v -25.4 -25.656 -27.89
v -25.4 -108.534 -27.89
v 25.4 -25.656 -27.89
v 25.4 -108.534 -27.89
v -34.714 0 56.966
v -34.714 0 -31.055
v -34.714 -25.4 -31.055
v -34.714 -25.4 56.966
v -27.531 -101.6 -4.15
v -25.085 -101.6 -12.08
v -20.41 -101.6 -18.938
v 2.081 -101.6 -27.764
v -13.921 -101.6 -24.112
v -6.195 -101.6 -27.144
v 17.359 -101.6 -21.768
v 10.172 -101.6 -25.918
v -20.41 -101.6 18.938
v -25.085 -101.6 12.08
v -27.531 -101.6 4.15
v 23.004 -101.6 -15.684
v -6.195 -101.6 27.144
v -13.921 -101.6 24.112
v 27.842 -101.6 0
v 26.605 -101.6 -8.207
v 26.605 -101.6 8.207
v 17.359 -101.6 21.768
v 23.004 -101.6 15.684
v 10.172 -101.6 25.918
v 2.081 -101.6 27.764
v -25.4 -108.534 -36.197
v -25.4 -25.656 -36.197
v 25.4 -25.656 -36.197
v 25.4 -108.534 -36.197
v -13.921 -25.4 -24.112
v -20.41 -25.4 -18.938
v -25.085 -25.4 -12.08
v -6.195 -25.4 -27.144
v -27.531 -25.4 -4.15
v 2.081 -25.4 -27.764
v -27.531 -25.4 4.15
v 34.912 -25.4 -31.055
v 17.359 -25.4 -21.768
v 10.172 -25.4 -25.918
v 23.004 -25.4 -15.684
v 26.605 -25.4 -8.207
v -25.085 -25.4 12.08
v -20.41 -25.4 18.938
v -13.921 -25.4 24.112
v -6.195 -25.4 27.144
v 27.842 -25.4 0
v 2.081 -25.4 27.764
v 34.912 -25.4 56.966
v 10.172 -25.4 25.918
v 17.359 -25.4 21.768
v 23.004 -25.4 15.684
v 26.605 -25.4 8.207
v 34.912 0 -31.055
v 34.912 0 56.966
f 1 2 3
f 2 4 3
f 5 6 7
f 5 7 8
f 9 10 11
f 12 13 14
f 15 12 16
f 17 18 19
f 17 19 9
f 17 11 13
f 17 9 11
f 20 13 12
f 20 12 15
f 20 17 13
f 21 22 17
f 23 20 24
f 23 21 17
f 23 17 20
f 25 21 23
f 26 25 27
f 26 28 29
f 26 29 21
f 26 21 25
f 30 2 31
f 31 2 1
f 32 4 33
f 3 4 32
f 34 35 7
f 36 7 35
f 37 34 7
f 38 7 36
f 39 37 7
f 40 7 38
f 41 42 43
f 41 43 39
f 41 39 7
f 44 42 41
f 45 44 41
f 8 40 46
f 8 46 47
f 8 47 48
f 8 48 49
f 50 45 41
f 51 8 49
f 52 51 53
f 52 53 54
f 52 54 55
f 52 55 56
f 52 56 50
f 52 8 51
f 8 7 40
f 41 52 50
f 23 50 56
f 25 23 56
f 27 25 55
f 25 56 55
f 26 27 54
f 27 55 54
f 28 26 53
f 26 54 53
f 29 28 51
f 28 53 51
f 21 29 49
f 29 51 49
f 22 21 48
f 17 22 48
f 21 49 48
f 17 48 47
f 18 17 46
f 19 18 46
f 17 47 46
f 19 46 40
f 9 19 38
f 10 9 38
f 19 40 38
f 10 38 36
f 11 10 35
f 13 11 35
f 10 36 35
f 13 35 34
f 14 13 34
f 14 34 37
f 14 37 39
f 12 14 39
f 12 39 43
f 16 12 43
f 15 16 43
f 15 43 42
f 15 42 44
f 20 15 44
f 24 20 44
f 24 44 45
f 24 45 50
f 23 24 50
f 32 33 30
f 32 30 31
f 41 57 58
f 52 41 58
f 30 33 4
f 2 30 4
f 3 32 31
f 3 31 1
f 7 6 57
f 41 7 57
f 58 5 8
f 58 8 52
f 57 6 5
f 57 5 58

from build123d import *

# Parameters (mm, degrees)
F0_R     = 27.8422041497
F1_DEPTH = 101.6
F2_W     = 69.6255154908
F2_H     = 88.0208928138
F3_DEPTH = 25.4
F4_W     = 82.8780960292
F4_H     = 8.307589218
F5_DEPTH = 25.4
F6_DEPTH = 25.4


# Not quite as in the source:
# - the program builds the solid bodies; features that only make, move or delete a surface that nothing else refers to are left out


with BuildPart() as f1:
    # F0 (on Front) → F1 (new body)
    with BuildSketch(Plane.XZ):
        Circle(F0_R)
    extrude(amount=F1_DEPTH)

    # F2 (on Front) → F3 (join)
    with BuildSketch(Plane.XZ):
        with Locations((0.0989008695, 12.9558844492)):
            Rectangle(F2_W, F2_H)
    extrude(amount=F3_DEPTH)


with BuildPart() as f5:
    # F4 (on Right) → F5 (new body)
    with BuildSketch(Plane.YZ):
        with Locations((-67.0949304476, -32.0435585454)):
            Rectangle(F4_W, F4_H)
    extrude(amount=F5_DEPTH)

    # F6 (add): a face of the model
    f6_faces = [f5.faces().sort_by_distance(p)[0] for p in [
        (0, -67.0949304476, -32.0435585454),
    ]]
    extrude(f6_faces, amount=F6_DEPTH)


solid = Compound([f1.part, f5.part])
